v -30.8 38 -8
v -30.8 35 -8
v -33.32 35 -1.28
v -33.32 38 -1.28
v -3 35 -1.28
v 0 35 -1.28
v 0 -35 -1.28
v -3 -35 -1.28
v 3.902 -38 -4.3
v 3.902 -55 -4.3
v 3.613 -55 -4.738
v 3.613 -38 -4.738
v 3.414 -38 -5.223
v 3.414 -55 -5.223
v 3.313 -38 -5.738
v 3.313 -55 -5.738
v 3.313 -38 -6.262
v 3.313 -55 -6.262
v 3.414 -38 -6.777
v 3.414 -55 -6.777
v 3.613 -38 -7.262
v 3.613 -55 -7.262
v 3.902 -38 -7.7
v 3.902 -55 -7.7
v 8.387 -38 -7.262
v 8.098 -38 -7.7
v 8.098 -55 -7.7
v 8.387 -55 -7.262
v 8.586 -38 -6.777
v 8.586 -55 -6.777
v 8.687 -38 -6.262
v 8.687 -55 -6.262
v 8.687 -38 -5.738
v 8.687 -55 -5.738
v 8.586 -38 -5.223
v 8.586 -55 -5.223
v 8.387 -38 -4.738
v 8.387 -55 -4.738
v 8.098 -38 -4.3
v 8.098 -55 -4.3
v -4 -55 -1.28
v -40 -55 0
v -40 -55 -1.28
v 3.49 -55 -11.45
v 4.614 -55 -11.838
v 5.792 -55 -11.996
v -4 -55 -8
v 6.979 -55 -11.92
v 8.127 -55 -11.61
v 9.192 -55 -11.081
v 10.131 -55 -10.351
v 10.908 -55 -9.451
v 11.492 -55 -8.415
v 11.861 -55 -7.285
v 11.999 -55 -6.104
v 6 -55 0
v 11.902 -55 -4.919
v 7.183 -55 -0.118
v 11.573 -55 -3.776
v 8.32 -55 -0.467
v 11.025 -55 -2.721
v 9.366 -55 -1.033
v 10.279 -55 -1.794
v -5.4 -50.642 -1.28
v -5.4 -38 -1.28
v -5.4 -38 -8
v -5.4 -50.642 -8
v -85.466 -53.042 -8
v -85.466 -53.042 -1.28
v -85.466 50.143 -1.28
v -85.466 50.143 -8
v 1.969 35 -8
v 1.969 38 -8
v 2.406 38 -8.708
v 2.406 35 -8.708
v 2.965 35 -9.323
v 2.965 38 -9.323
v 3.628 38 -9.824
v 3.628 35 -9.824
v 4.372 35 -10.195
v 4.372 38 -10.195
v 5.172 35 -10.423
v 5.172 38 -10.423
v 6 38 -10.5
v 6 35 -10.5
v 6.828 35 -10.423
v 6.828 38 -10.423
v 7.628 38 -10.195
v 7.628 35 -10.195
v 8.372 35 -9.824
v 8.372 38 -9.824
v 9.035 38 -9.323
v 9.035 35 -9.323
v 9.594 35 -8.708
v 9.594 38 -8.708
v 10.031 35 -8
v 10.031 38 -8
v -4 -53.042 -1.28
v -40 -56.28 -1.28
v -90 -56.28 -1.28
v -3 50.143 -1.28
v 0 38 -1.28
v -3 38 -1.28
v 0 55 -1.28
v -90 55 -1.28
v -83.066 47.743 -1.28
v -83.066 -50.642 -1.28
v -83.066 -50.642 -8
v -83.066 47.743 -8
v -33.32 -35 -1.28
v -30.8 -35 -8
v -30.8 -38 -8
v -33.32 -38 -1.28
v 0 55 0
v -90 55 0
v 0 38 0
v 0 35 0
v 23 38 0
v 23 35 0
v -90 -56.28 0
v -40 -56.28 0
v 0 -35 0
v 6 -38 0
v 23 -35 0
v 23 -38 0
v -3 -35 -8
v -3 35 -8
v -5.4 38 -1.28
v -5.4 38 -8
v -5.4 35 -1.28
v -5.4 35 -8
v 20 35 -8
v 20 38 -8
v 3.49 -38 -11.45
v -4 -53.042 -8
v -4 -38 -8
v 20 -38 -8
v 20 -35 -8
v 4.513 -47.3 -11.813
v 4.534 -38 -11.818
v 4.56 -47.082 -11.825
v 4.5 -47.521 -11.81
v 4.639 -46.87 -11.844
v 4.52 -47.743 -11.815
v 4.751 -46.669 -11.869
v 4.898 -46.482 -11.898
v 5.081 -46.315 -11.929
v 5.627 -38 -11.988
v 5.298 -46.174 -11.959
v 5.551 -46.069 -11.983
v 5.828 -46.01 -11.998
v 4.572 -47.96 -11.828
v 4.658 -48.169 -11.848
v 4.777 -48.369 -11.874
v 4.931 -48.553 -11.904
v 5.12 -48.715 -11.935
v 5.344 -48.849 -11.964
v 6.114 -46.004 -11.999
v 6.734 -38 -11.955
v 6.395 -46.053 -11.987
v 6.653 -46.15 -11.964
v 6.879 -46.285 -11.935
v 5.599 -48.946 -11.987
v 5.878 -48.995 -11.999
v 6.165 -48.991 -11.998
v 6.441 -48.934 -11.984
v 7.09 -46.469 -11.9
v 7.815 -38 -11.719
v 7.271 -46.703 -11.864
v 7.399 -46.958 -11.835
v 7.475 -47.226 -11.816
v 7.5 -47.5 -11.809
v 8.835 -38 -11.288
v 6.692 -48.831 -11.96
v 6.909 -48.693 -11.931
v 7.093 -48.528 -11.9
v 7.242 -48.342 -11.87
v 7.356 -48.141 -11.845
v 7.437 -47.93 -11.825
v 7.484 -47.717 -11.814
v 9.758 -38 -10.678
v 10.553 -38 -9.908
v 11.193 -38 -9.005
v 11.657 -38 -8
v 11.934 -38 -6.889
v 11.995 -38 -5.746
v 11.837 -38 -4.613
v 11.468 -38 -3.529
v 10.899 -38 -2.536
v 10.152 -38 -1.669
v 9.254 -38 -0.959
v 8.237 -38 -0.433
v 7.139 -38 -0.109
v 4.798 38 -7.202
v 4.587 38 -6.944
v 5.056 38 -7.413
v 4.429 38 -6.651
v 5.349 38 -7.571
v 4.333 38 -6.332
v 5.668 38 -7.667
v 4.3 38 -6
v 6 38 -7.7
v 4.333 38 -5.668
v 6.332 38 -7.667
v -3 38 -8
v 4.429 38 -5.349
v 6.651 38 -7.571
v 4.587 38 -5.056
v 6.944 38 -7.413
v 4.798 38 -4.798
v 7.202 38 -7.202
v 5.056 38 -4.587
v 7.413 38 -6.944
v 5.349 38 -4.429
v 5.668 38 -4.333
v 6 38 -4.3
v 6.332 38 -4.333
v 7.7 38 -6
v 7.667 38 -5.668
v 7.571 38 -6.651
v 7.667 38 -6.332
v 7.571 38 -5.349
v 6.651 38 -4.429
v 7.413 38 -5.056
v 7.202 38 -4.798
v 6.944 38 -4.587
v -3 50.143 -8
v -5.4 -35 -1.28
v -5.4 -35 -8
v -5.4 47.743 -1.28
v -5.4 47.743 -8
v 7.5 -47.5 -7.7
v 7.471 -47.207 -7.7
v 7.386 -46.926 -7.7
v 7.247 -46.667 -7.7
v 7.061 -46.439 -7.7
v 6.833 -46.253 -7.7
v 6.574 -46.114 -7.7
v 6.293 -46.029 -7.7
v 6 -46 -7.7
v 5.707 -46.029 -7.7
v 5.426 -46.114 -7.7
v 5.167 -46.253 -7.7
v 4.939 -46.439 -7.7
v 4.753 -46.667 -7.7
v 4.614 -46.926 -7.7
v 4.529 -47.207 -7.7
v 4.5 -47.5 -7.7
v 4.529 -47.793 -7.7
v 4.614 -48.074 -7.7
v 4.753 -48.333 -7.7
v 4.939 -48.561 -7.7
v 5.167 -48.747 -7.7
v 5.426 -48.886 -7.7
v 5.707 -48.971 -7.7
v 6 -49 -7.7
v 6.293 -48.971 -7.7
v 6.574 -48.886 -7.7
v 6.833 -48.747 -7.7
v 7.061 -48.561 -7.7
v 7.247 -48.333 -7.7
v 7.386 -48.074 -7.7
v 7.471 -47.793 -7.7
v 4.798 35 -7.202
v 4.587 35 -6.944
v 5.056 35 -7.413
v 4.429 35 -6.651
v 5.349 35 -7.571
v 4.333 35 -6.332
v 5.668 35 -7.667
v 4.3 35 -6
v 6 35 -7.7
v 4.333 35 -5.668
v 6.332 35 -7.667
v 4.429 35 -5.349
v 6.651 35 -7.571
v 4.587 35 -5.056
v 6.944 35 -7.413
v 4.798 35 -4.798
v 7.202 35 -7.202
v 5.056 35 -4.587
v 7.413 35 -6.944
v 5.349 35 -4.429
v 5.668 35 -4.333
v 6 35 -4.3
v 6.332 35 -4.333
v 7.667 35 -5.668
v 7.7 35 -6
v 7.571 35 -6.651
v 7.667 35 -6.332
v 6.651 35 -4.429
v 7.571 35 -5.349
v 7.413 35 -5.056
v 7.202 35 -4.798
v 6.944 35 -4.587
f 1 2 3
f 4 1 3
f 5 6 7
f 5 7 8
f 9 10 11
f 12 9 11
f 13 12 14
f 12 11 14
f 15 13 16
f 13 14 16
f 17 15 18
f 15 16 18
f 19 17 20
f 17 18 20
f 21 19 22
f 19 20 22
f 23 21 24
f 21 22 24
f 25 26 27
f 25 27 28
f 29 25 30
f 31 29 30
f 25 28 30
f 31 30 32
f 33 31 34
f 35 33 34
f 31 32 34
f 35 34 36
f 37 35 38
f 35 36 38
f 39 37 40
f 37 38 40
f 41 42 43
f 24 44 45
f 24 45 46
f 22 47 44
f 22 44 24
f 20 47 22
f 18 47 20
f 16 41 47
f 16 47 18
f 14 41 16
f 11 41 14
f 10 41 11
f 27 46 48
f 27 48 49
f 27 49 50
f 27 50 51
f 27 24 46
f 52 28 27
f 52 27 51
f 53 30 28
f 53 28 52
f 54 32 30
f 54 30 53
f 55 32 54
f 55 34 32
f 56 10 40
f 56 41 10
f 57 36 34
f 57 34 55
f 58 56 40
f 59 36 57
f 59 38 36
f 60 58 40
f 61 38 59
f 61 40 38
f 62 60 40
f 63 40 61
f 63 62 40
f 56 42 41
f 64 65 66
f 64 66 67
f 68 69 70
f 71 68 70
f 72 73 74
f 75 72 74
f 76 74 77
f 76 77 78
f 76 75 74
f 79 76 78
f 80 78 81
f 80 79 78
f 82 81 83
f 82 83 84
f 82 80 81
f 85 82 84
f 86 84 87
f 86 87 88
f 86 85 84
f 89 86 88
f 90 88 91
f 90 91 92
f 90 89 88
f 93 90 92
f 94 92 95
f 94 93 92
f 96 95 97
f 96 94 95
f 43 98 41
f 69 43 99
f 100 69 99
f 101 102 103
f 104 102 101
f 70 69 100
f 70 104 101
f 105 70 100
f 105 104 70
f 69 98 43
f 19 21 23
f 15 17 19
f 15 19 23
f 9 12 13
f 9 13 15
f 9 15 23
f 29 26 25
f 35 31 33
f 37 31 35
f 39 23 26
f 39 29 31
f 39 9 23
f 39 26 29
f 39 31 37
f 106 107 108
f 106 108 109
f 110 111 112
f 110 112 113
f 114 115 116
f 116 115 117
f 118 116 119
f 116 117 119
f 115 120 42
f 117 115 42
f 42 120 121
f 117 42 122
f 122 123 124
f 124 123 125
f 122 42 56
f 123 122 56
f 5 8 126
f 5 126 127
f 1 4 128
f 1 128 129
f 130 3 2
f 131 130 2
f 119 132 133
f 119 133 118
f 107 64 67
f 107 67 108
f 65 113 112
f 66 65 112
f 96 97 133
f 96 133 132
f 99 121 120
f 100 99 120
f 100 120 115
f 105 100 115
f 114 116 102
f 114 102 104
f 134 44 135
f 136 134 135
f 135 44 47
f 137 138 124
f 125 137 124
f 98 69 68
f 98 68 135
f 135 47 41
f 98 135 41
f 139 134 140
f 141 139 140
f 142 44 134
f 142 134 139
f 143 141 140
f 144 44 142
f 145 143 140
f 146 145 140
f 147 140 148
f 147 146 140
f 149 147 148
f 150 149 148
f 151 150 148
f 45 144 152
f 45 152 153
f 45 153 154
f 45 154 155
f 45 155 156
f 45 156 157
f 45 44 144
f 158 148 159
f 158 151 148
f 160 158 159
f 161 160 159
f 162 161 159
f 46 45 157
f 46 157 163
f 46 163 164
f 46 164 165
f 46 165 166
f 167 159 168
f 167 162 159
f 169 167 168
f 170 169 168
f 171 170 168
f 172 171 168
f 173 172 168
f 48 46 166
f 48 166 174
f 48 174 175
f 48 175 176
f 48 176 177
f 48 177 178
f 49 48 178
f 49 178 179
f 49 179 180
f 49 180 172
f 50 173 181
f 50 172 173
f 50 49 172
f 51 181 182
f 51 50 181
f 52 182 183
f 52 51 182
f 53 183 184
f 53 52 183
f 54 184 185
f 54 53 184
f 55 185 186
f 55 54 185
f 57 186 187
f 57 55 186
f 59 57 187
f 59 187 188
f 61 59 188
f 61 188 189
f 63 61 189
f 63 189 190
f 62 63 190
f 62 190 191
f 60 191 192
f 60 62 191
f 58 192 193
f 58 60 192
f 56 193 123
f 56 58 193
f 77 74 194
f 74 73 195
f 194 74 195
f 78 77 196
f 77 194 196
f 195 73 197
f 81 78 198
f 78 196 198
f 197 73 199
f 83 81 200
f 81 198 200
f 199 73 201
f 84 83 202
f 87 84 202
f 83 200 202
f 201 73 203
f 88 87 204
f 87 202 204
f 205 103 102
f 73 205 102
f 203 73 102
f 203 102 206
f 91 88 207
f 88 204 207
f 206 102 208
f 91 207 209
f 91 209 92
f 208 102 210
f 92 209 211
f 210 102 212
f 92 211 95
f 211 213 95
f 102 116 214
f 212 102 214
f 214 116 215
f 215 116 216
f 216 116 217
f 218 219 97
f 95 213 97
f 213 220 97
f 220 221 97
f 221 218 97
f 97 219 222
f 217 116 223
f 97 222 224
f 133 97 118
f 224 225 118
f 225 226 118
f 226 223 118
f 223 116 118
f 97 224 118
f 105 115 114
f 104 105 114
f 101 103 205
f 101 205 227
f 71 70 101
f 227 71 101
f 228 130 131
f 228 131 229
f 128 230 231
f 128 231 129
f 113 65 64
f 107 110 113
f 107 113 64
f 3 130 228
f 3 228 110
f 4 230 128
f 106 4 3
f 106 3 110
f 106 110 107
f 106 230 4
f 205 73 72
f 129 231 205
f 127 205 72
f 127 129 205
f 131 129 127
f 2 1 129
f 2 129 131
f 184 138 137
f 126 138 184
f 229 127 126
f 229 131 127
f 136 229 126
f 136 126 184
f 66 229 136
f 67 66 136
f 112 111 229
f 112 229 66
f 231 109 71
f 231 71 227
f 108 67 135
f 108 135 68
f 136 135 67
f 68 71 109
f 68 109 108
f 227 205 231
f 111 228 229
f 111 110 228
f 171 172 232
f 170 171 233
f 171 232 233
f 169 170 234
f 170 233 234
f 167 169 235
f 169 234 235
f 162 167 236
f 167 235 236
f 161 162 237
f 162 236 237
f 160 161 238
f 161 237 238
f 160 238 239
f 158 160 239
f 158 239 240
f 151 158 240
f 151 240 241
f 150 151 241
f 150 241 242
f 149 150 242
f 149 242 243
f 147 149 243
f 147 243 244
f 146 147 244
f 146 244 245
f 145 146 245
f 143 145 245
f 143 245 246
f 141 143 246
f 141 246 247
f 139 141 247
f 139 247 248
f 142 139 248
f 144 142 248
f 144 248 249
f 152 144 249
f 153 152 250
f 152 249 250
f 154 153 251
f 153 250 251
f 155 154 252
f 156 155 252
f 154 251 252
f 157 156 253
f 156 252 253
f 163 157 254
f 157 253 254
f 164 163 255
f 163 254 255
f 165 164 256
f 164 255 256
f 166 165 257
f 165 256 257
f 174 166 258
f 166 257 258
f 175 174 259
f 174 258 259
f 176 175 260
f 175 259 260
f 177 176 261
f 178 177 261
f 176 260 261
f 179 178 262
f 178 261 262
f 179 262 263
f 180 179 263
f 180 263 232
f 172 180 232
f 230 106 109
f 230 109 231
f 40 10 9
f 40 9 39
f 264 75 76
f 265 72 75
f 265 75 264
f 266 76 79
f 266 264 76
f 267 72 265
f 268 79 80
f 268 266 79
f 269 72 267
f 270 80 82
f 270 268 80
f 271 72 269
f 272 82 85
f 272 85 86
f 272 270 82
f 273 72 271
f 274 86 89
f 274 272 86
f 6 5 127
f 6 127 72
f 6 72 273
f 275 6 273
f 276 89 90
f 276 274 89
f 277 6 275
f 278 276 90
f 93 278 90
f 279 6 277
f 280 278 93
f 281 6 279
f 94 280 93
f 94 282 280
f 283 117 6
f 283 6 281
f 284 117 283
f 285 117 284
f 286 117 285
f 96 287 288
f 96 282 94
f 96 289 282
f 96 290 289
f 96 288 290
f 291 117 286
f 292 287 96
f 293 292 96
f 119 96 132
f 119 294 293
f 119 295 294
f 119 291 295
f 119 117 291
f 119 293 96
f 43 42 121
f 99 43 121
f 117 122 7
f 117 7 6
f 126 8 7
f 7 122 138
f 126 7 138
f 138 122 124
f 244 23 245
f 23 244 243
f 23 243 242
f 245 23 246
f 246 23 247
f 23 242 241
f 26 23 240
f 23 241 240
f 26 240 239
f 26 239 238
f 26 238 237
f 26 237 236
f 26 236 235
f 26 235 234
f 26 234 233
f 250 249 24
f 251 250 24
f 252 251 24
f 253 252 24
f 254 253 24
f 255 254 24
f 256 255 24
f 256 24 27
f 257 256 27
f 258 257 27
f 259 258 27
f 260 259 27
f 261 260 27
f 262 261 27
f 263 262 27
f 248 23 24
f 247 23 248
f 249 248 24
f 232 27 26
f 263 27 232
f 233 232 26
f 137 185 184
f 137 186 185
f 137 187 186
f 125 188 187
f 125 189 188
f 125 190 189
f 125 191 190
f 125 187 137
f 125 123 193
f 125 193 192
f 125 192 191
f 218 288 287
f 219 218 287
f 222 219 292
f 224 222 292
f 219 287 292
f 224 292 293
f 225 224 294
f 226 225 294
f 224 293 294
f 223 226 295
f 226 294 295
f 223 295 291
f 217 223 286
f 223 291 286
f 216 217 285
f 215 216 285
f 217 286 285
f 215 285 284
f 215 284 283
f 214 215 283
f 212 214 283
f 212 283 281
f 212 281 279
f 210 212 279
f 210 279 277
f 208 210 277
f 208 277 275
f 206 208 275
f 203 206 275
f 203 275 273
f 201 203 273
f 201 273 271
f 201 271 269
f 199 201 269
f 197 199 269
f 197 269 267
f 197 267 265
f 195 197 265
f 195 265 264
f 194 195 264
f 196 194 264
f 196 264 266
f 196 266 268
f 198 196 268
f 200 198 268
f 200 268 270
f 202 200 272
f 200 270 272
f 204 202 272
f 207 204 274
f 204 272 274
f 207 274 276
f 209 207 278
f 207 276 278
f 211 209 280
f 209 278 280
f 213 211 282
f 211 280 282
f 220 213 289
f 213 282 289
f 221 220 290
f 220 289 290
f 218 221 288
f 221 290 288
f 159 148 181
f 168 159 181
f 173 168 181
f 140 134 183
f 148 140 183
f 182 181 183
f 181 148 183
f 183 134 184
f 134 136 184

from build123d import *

# Parameters (mm, degrees)
PAD014_DEPTH               = 1.28
PAD015_DEPTH               = 17
SKETCH018_W                = 82.4657333469
SKETCH018_H                = 103.1855755689
PAD016_DEPTH               = 8
PAD020_DEPTH               = 3
PAD020_MIRRORED008_2_DEPTH = 3
SKETCH026_R                = 1.5
POCKET002_DEPTH            = 4.301
MULTITRANSFORM004_FACE58_W = 3
MULTITRANSFORM004_FACE58_H = 6.72
PAD021_DEPTH               = 5
PAD021_FACE71_W            = 3
PAD021_FACE71_H            = 6.72
PAD022_DEPTH               = 4
SKETCH033_R                = 4.5
PAD029_DEPTH               = 3
SKETCH034_R                = 1.7
POCKET005_DEPTH            = 55.001


with BuildPart() as part:
    # Sketch016 → Pad014 (new body)
    with BuildSketch(Plane.XY):
        Polygon((-90, -56.28), (-90, 55), (0, 55), (0, 0), (0, -55), (-40, -55), (-40, -56.28), align=None)
    extrude(amount=-PAD014_DEPTH)

    # Sketch017 (on Face5 of Pad014) → Pad015 (join)
    with BuildSketch(Plane.XZ.offset(55)):
        with BuildLine():
            ThreePointArc((3.4899774441, -11.449751074), (11.8608235957, -7.2848139089), (6.0000000021, 0))
            Line((6.0000000021, 0), (0, 0))
            Line((-4, 0), (0, 0))
            Line((-4, -8), (-4, 0))
            Line((3.4899774441, -11.449751074), (-4, -8))
        make_face()
        with BuildLine():
            ThreePointArc((3.9023823037, -4.3), (3.3, -6), (3.9023823037, -7.7))
            Line((3.9023823037, -7.7), (8.0976176963, -7.7))
            ThreePointArc((8.0976176963, -7.7), (8.7, -6), (8.0976176963, -4.3))
            Line((3.9023823037, -4.3), (8.0976176963, -4.3))
        make_face(mode=Mode.SUBTRACT)
    extrude(amount=-PAD015_DEPTH)

    # Sketch018 → Pad016 (join)
    with BuildSketch(Plane.XY):
        with Locations((-44.2328666735, -1.4496544031)):
            Rectangle(SKETCH018_W, SKETCH018_H)
        Polygon((-5.4, -50.6424421875), (-83.0657333469, -50.6424421875), (-83.0657333469, -38.075158972), (-83.0657333469, -35.675158972), (-83.0657333469, 47.7431333814), (-5.4, 47.7431333814), (-5.4, -35.675159), (-5.4, -38.075157), align=None, mode=Mode.SUBTRACT)
    extrude(amount=-PAD016_DEPTH)

    # Sketch024 → Pad020 (join)
    with BuildSketch(Plane.XZ.offset(35)):
        Polygon((23, 0), (-3, 0), (-3, -8), (20, -8), align=None)
    pad020 = extrude(amount=PAD020_DEPTH)

    # Sketch024 Mirrored008 2 → Pad020 Mirrored008 2 (add)
    with BuildSketch(Plane(origin=(-10.8, -35, 0), x_dir=(-1, 0, 0), z_dir=(0, 1, 0))):
        Polygon((23, 0), (-3, 0), (-3, -8), (20, -8), align=None)
    pad020_mirrored008_2 = extrude(amount=-PAD020_MIRRORED008_2_DEPTH)

    # Mirrored009: Pad020, Pad020 Mirrored008 2 across XZ
    add(pad020.mirror(Plane.XZ))
    add(pad020_mirrored008_2.mirror(Plane.XZ))

    # Sketch026 (on Face40 of MultiTransform004) → Pocket002 (cut, through all)
    with BuildSketch(Plane.XY.offset(-7.7)):
        with Locations((6, -47.5)):
            Circle(SKETCH026_R)
    extrude(amount=-POCKET002_DEPTH, mode=Mode.SUBTRACT)

    # MultiTransform004 Face58 → Pad021 (add)
    with BuildSketch(Plane(origin=(-7.8, -36.5, -4.64), x_dir=(0, -1, 0), z_dir=(1, 0, 0))):
        Rectangle(MULTITRANSFORM004_FACE58_W, MULTITRANSFORM004_FACE58_H)
    extrude(amount=PAD021_DEPTH)

    # Pad021 Face71 → Pad022 (add)
    with BuildSketch(Plane(origin=(-7.8, 36.5, -4.64), x_dir=(0, -1, 0), z_dir=(1, 0, 0))):
        Rectangle(PAD021_FACE71_W, PAD021_FACE71_H)
    extrude(amount=PAD022_DEPTH)

    # Sketch033 → Pad029 (join)
    with BuildSketch(Plane.XZ.offset(-35)):
        with Locations((6, -6)):
            Circle(SKETCH033_R)
    extrude(amount=-PAD029_DEPTH)

    # Sketch034 → Pocket005 (cut, through all)
    with BuildSketch(Plane.XZ):
        with Locations((6, -6)):
            Circle(SKETCH034_R)
    extrude(amount=-POCKET005_DEPTH, mode=Mode.SUBTRACT)


solid = part.part
